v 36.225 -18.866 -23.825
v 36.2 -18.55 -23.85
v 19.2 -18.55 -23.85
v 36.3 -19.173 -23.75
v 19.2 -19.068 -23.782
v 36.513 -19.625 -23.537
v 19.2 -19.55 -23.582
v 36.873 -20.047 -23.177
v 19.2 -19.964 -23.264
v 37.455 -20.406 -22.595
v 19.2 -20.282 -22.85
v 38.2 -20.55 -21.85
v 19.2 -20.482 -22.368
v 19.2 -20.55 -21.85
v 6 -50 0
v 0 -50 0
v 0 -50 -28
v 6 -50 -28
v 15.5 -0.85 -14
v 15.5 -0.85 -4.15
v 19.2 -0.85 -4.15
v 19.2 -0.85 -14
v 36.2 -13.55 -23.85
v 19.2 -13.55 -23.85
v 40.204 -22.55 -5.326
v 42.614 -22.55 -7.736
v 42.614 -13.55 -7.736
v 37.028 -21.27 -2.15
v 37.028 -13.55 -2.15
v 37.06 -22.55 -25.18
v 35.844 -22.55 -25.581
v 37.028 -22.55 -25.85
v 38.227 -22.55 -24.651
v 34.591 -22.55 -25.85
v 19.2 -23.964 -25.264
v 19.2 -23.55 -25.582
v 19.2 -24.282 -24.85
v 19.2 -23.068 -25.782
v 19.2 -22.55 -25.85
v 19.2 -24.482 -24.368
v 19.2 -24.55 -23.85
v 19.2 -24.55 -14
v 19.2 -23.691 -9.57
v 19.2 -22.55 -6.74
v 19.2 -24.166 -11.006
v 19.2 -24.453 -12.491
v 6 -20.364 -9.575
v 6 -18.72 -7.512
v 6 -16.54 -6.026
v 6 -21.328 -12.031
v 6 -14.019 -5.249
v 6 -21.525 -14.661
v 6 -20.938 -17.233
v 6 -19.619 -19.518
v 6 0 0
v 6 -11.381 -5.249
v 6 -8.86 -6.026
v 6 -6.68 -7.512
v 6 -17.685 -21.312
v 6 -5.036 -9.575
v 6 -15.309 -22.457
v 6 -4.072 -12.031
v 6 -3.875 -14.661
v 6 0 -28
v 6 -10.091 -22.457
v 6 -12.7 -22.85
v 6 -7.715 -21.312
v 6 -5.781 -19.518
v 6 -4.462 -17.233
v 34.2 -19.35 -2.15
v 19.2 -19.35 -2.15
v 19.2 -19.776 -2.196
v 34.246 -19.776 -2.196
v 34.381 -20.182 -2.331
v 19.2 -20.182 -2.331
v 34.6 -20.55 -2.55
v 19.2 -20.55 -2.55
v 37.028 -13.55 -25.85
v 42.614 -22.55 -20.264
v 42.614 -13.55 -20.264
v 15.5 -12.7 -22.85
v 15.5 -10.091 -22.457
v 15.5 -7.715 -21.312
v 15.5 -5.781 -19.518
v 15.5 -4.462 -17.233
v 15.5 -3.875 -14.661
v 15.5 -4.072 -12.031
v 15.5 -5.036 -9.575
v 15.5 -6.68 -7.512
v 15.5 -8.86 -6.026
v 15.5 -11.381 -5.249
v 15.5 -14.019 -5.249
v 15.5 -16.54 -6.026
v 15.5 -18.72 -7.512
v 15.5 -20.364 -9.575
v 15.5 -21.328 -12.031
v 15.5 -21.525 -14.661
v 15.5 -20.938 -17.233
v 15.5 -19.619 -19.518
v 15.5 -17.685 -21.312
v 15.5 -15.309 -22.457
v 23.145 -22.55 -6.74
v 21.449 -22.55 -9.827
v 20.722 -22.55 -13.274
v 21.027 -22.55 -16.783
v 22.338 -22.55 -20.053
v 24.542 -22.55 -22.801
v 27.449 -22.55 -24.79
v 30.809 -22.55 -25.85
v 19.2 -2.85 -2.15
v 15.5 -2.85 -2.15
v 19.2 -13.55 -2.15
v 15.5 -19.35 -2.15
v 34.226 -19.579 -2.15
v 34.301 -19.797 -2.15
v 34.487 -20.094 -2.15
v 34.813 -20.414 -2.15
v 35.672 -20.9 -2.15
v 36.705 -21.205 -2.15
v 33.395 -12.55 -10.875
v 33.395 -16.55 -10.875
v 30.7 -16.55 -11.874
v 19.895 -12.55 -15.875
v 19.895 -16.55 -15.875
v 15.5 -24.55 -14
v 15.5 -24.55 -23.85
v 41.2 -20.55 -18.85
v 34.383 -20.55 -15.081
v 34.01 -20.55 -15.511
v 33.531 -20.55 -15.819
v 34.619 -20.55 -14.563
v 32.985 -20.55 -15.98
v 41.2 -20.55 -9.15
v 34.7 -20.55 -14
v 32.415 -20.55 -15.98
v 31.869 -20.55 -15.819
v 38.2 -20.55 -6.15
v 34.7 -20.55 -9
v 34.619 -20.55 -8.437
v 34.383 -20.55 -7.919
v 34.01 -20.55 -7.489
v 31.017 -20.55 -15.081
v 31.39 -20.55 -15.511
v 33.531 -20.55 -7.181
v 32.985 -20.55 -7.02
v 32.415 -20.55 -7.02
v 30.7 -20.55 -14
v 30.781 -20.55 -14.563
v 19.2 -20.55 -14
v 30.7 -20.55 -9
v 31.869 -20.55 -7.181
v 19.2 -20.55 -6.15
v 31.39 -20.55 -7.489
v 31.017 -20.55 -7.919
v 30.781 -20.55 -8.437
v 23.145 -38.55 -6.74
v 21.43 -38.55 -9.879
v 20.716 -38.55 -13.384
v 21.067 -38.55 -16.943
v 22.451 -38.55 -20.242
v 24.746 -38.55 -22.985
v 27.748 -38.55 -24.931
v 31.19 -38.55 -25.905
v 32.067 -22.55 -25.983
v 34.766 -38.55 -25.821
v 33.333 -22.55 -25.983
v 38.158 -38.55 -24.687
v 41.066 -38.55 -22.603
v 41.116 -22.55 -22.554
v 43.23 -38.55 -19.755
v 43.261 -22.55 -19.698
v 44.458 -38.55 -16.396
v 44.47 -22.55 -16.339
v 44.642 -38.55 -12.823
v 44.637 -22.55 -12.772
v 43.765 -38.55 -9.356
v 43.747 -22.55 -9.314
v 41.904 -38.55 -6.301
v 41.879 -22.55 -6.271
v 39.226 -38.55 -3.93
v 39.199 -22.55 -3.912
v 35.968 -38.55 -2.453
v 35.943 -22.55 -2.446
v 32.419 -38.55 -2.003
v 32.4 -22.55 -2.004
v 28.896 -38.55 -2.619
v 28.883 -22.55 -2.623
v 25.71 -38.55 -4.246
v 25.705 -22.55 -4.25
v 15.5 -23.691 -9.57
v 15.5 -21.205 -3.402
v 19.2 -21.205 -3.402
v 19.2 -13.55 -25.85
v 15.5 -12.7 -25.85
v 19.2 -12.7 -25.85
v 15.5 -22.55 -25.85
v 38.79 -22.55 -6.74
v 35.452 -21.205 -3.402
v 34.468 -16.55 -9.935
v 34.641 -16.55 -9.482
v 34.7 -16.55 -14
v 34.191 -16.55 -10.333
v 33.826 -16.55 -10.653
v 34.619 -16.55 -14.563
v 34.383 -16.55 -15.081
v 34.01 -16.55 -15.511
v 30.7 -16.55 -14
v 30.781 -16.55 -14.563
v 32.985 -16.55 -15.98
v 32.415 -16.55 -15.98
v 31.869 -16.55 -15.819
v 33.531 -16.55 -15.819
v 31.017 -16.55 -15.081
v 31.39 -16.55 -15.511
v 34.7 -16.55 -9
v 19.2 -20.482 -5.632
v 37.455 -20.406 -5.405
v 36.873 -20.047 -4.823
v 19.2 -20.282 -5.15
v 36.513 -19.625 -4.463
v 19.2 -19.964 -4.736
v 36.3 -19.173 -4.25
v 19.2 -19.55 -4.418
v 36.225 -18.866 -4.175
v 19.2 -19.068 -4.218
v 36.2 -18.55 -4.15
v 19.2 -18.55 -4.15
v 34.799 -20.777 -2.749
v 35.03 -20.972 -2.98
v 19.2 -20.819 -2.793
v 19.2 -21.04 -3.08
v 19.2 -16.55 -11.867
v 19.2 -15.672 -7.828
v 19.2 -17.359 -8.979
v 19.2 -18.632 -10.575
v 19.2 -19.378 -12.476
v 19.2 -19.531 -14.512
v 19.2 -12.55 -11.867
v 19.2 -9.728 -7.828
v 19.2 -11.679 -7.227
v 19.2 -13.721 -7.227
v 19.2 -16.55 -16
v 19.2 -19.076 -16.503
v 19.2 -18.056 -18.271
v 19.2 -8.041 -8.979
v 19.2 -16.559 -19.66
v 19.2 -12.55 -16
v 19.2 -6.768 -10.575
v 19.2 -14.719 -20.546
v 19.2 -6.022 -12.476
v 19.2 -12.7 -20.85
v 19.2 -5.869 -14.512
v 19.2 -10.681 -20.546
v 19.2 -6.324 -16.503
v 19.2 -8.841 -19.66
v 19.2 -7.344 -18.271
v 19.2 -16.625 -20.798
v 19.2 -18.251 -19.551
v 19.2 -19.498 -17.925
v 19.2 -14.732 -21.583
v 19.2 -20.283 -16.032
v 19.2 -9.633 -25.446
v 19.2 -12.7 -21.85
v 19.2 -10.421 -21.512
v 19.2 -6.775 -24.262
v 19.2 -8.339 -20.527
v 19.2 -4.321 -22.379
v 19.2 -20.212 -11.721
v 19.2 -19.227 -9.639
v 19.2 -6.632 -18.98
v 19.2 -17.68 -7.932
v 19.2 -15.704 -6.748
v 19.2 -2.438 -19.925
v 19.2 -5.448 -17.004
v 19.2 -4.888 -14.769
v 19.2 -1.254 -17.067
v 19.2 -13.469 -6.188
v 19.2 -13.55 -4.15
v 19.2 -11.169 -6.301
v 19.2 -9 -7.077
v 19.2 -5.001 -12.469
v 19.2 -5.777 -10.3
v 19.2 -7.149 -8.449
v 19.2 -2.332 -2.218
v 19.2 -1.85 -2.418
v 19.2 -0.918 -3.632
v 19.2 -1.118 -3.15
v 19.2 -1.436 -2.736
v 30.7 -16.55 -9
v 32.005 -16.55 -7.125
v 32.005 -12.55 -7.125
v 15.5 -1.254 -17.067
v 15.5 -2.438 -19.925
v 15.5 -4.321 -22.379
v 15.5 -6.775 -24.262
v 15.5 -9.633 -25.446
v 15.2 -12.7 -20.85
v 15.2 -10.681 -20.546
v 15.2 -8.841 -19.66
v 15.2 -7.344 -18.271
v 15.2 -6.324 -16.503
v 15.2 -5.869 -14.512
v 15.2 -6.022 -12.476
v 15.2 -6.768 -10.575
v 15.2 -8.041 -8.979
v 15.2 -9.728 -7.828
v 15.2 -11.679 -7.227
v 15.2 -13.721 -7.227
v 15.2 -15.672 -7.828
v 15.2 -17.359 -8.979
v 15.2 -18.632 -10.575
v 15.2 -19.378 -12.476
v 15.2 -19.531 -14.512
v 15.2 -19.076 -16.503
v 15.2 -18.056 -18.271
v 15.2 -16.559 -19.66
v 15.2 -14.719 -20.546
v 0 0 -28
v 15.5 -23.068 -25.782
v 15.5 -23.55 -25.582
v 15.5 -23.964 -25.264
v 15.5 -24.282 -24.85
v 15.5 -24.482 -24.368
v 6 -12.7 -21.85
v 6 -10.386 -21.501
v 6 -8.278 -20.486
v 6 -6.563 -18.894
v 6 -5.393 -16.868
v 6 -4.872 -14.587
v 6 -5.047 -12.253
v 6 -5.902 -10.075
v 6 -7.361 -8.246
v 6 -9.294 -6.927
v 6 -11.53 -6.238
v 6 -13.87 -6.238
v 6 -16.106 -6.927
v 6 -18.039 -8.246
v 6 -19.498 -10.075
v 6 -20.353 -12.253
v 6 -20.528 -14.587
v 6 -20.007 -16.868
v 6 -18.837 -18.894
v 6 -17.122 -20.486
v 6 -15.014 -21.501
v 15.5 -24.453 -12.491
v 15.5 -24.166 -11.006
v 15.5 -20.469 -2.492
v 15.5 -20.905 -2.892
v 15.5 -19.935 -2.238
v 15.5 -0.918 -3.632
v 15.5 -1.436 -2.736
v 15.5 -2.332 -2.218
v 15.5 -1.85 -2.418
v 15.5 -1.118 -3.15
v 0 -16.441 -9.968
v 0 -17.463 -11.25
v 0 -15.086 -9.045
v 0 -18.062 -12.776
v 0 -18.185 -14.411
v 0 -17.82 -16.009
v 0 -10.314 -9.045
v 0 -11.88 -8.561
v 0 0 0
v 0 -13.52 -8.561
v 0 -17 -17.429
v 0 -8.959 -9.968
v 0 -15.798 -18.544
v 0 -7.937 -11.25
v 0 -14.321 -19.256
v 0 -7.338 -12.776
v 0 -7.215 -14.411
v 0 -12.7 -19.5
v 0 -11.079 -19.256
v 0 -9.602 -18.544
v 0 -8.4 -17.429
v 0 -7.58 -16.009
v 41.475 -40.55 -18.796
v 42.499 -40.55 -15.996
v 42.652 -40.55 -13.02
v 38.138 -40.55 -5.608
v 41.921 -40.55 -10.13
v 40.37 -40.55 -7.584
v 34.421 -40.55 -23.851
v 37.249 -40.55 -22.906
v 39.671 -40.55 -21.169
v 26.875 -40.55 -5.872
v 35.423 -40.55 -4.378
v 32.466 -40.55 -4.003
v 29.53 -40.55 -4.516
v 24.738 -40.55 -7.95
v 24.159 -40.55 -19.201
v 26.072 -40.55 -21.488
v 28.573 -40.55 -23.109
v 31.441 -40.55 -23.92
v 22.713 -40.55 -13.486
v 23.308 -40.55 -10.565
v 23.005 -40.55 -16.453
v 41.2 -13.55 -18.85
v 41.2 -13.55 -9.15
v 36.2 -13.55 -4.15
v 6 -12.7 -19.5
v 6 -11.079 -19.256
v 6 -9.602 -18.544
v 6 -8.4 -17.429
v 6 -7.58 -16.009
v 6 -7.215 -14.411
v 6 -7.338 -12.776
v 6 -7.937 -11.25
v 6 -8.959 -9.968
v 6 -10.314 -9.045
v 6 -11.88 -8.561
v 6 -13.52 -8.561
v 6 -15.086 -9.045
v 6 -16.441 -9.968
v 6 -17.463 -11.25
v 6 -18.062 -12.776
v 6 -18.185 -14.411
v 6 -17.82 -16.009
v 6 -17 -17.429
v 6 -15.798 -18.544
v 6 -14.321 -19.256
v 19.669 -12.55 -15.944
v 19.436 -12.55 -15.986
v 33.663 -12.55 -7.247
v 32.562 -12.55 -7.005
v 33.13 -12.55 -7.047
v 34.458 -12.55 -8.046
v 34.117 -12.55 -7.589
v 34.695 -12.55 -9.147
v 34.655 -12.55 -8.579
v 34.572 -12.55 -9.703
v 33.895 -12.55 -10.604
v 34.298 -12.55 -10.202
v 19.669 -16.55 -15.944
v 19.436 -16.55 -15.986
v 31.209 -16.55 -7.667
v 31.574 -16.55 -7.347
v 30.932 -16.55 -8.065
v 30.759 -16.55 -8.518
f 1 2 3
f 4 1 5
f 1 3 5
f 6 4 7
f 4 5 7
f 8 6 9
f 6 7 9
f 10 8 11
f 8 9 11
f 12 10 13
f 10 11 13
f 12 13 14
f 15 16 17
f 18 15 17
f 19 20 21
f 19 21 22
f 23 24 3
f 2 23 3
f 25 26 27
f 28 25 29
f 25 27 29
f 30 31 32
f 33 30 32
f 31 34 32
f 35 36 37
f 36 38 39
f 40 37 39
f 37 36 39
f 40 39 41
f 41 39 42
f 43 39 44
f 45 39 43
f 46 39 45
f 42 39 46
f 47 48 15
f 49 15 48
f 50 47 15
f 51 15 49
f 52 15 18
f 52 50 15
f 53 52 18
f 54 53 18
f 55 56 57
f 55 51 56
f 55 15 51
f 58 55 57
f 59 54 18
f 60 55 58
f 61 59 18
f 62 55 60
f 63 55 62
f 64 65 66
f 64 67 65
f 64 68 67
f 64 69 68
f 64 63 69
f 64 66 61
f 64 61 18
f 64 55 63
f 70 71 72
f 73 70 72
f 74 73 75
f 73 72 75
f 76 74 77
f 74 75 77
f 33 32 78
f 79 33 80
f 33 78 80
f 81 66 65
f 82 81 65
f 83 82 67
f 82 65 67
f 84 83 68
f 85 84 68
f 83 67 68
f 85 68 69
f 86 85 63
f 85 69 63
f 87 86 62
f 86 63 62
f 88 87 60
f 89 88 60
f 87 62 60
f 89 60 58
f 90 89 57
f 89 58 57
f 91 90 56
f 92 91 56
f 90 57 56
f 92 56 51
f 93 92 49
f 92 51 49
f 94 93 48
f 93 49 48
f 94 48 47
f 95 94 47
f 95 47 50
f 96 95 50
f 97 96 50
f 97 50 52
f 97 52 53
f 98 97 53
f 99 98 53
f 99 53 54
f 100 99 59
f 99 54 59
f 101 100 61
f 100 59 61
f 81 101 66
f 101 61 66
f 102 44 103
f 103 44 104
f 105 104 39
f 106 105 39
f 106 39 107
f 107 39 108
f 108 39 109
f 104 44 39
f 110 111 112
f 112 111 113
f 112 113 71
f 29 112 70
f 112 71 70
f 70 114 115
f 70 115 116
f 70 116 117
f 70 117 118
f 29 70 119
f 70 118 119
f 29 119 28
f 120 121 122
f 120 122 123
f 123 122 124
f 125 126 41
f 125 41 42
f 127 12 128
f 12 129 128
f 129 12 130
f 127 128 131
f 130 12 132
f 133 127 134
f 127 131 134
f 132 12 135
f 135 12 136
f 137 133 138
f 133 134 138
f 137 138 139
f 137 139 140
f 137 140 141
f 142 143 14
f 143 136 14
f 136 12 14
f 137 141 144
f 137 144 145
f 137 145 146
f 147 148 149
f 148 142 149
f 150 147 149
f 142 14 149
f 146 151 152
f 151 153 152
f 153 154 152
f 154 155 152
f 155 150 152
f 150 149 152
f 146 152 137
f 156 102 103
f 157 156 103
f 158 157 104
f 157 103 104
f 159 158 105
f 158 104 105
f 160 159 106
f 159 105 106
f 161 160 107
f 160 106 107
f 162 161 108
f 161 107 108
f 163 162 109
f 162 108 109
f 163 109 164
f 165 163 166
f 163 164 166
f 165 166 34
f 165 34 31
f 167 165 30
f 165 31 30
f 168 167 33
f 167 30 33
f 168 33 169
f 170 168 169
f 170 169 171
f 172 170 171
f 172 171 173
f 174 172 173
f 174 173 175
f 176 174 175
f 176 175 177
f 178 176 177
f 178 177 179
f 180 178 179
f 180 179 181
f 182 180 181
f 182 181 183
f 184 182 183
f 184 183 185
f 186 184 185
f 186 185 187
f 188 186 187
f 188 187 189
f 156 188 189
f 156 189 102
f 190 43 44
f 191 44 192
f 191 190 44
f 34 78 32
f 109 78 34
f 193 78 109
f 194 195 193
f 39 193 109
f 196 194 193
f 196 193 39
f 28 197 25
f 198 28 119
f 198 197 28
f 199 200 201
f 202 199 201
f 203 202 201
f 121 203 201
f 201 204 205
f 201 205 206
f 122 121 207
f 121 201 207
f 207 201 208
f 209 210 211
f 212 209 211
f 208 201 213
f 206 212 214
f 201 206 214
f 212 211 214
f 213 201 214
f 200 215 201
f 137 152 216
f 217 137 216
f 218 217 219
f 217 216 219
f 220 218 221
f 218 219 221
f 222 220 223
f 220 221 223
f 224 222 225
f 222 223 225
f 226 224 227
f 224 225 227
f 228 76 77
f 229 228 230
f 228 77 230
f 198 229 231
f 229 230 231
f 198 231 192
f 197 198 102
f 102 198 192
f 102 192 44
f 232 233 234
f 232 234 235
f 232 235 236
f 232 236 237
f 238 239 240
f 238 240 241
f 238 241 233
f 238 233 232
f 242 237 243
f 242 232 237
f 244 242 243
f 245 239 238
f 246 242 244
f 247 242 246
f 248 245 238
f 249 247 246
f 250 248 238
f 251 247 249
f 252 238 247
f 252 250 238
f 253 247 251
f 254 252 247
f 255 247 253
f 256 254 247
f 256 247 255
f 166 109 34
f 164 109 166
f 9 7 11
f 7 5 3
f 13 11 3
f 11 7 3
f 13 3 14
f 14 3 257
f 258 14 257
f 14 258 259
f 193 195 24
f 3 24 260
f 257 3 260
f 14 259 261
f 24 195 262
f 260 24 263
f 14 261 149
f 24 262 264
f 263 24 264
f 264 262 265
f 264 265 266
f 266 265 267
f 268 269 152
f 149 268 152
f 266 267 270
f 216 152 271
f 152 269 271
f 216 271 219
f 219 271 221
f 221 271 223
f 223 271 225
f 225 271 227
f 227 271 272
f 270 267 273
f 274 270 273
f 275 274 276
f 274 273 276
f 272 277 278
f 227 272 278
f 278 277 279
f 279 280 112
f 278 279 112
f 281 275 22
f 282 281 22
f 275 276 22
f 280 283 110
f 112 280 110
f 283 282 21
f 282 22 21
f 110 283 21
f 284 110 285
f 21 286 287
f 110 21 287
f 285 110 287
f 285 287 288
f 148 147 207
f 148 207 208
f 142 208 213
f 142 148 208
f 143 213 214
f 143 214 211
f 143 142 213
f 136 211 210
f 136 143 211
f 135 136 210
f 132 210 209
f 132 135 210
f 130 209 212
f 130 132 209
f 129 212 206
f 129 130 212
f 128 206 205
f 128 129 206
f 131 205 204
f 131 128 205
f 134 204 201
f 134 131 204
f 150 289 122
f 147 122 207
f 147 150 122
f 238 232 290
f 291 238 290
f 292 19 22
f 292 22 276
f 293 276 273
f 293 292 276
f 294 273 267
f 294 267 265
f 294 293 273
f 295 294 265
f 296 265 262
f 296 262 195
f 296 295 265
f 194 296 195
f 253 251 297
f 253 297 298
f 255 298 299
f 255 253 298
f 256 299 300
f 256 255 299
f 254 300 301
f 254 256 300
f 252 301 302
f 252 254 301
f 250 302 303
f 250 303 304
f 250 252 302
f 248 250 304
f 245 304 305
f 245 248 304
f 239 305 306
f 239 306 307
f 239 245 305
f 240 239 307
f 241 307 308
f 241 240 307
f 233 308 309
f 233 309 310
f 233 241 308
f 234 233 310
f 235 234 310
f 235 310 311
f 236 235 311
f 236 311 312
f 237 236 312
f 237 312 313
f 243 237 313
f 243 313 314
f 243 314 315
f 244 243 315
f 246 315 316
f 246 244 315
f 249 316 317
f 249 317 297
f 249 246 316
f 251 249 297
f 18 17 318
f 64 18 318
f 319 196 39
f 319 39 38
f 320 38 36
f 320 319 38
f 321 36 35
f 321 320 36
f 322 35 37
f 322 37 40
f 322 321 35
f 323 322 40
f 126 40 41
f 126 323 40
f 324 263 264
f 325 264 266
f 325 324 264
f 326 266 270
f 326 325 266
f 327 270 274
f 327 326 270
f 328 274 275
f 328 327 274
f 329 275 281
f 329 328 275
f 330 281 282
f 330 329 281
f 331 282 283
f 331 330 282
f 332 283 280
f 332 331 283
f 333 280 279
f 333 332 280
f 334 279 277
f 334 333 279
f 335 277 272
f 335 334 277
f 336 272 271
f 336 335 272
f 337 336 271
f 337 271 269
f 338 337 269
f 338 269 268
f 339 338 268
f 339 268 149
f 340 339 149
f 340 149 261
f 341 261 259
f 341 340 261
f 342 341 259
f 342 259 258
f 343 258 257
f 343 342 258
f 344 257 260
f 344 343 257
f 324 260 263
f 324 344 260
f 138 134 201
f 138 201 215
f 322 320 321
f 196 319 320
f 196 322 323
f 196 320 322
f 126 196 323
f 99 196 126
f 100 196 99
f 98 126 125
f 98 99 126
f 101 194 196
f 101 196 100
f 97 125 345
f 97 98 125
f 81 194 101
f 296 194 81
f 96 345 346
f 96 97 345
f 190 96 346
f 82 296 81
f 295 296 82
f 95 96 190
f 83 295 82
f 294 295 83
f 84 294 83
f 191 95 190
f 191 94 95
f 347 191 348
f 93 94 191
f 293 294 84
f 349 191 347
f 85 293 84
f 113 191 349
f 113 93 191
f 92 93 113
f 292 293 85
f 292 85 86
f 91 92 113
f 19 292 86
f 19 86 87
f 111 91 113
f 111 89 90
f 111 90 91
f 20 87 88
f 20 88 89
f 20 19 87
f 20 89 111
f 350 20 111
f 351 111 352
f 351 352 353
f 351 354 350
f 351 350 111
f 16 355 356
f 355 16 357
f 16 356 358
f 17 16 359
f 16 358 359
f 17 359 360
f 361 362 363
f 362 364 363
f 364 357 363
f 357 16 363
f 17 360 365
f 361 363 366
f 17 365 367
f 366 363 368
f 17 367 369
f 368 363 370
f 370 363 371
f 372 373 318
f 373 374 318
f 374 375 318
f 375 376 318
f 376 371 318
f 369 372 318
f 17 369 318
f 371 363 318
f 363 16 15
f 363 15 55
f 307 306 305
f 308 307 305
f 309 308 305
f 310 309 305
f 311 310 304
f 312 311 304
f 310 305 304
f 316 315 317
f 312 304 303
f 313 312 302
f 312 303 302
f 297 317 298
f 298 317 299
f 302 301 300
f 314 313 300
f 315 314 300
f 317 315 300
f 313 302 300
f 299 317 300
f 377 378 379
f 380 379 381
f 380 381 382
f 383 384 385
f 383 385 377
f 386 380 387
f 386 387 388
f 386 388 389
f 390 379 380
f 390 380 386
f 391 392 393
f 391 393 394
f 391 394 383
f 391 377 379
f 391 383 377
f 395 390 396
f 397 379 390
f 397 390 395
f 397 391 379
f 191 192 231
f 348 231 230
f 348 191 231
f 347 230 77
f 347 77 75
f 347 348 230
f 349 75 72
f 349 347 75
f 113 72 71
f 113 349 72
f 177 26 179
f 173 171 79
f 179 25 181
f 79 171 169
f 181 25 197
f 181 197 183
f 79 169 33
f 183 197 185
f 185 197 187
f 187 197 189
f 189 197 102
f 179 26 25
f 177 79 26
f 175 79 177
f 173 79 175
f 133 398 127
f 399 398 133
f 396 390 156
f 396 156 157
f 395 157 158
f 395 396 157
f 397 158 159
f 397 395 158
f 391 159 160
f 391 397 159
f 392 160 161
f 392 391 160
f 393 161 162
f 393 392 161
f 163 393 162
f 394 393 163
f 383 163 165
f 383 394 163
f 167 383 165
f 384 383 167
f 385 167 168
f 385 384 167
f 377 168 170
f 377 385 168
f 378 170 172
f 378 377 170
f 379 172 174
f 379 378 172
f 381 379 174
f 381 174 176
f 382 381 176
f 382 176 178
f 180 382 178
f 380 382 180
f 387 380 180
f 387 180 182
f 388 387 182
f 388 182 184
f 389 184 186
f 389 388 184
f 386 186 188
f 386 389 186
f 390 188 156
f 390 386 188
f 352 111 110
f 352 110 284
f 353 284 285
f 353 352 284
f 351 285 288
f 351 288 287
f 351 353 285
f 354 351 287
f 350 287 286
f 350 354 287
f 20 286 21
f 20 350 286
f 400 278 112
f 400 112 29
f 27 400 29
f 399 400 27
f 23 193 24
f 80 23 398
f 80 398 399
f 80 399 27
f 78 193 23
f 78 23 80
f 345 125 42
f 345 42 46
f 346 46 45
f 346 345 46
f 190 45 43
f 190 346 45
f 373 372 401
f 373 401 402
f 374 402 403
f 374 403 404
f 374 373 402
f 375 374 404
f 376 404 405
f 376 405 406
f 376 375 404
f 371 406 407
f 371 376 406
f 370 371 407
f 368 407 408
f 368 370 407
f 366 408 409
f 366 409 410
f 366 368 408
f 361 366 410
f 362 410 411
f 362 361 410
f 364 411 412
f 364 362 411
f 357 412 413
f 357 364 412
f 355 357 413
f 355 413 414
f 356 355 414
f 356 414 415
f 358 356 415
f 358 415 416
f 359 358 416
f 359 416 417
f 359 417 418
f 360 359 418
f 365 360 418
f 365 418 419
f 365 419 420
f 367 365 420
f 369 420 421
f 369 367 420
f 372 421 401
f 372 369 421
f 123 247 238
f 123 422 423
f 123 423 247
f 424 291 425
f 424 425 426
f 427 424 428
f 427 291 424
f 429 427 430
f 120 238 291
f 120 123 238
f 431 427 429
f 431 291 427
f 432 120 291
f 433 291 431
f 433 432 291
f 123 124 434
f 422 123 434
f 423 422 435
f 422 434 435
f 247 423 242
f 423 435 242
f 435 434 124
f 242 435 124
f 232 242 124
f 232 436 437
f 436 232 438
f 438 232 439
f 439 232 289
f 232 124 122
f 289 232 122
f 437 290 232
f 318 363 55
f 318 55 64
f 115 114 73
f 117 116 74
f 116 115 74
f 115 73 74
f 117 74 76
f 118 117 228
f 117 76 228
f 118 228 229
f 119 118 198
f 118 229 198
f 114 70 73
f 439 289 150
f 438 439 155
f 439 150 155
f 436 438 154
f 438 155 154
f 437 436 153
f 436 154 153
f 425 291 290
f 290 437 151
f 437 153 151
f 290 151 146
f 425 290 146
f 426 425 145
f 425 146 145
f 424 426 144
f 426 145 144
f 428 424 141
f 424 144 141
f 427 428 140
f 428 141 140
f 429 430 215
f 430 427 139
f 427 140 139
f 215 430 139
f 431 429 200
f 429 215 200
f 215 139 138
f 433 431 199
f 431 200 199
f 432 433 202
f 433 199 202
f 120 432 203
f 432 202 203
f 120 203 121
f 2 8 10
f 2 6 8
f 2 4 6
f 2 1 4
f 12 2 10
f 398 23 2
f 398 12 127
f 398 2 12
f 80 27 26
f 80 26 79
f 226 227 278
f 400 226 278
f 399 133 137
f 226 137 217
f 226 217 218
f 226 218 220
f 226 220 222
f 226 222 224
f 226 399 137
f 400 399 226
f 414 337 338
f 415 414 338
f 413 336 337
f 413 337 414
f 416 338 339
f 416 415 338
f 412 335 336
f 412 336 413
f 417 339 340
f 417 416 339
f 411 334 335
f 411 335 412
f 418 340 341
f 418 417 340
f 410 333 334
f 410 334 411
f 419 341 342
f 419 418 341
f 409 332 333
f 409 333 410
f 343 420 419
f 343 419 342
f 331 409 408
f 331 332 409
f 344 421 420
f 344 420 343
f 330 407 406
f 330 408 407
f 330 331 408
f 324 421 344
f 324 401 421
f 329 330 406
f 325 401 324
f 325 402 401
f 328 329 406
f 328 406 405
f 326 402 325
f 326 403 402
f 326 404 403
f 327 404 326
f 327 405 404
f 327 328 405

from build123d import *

# Parameters (mm, degrees)
SKETCH1_W               = 28
SKETCH1_H               = 50
SKETCH1_R               = 5.5
BOSS_EXTRUDE1_DEPTH     = 6
SKETCH2_R               = 8.85
SKETCH2_R_2             = 7.85
BOSS_EXTRUDE2_DEPTH     = 9.5
SKETCH3_R               = 7.85
BOSS_EXTRUDE3_DEPTH     = 3.7
BOSS_EXTRUDE4_DEPTH     = 22
CHAMFER1_SIZE           = 7
BOSS_EXTRUDE5_DEPTH     = 2
BOSS_EXTRUDE6_DEPTH     = 2
BOSS_EXTRUDE7_DEPTH     = 9
CUT_EXTRUDE1_DEPTH      = 63.678335221
CUT_EXTRUDE1_DEPTH_BACK = 63.678335221
BOSS_EXTRUDE8_DEPTH     = 4
BOSS_EXTRUDE9_DEPTH     = 4
SKETCH12_R              = 6.85
BOSS_EXTRUDE10_DEPTH    = 4
SKETCH13_R              = 12
BOSS_EXTRUDE11_DEPTH    = 18
CHAMFER2_SIZE           = 2


with BuildPart() as part:
    # Sketch1 → Boss-Extrude1 (new body)
    with BuildSketch(Plane(origin=(0, 0, 0), x_dir=(0, 0, -1), z_dir=(1, 0, 0))):
        with Locations((14, -25)):
            Rectangle(SKETCH1_W, SKETCH1_H)
        with Locations((14, -12.7)):
            Circle(SKETCH1_R, mode=Mode.SUBTRACT)
    extrude(amount=BOSS_EXTRUDE1_DEPTH)

    # Sketch2 → Boss-Extrude2 (add)
    with BuildSketch(Plane(origin=(6, 0, 0), x_dir=(0, 0, -1), z_dir=(1, 0, 0))):
        with Locations((14, -12.7)):
            Circle(SKETCH2_R)
        with Locations((14, -12.7)):
            Circle(SKETCH2_R_2, mode=Mode.SUBTRACT)
    extrude(amount=BOSS_EXTRUDE2_DEPTH)

    # Sketch3 → Boss-Extrude3 (add)
    with BuildSketch(Plane(origin=(15.5, 0, 0), x_dir=(0, 0, -1), z_dir=(1, 0, 0))):
        with BuildLine():
            Line((2.15, -12.7), (2.15, -2.85))
            ThreePointArc((2.15, -2.85), (2.735786438, -1.435786438), (4.15, -0.85))
            Line((4.15, -0.85), (14, -0.85))
            ThreePointArc((14, -0.85), (22.379215357, -4.320784643), (25.85, -12.7))
            Line((25.85, -12.7), (25.85, -22.55))
            ThreePointArc((25.85, -22.55), (25.264213562, -23.964213562), (23.85, -24.55))
            Line((23.85, -24.55), (14, -24.55))
            ThreePointArc((14, -24.55), (11.74368498, -24.333208609), (9.569926867, -23.690766672))
            Line((9.569926867, -23.690766672), (3.402308332, -21.204770746))
            ThreePointArc((3.402308332, -21.204770746), (2.492383739, -20.46885486), (2.15, -19.34978903))
            Line((2.15, -19.34978903), (2.15, -12.7))
        make_face()
        with Locations((14, -12.7)):
            Circle(SKETCH3_R, mode=Mode.SUBTRACT)
    extrude(amount=BOSS_EXTRUDE3_DEPTH)

    # Sketch4 → Boss-Extrude4 (add)
    with BuildSketch(Plane(origin=(19.2, 0, 0), x_dir=(0, 0, -1), z_dir=(1, 0, 0))):
        with BuildLine():
            Line((21.85, -20.55), (6.15, -20.55))
            ThreePointArc((6.15, -20.55), (4.735786438, -19.964213562), (4.15, -18.55))
            Line((4.15, -18.55), (4.15, -13.55))
            Line((4.15, -13.55), (2.15, -13.55))
            Line((2.15, -13.55), (2.15, -19.34978903))
            ThreePointArc((2.15, -19.34978903), (2.252675107, -19.982369656), (2.55015825, -20.55))
            ThreePointArc((2.55015825, -20.55), (2.931431385, -20.935692725), (3.402308332, -21.204770746))
            Line((3.402308332, -21.204770746), (6.739747784, -22.55))
            Line((6.739747784, -22.55), (25.85, -22.55))
            Line((25.85, -22.55), (25.85, -20.55))
            Line((25.85, -20.55), (25.85, -13.55))
            Line((25.85, -13.55), (23.85, -13.55))
            Line((23.85, -13.55), (23.85, -18.55))
            ThreePointArc((23.85, -18.55), (23.264213562, -19.964213562), (21.85, -20.55))
        make_face()
    extrude(amount=BOSS_EXTRUDE4_DEPTH)

    # Chamfer1
    # the kernel refuses this chamfer: 7 mm, written as the material it takes off along each edge
    with BuildSketch(Plane(origin=(41.2, 4.451780916, -25.85), x_dir=(0.027495876610586112, 0, 0.9996219169112968), z_dir=(0, -1, 0))) as chamfer1_piece_1:
        Polygon((CHAMFER1_SIZE * 0.999621916911, CHAMFER1_SIZE * 0.0274958766106), (-CHAMFER1_SIZE * 0.0274958766106, CHAMFER1_SIZE * 0.999621916911), (0, 0), align=None)
    extrude(amount=45.003561832, mode=Mode.SUBTRACT)
    with BuildSketch(Plane(origin=(41.2, 4.451780916, -2.15), x_dir=(0.02749587661058612, 0, -0.9996219169112968), z_dir=(0, -1, 0))) as chamfer1_piece_2:
        Polygon((CHAMFER1_SIZE * 0.999621916911, -CHAMFER1_SIZE * 0.0274958766106), (-CHAMFER1_SIZE * 0.0274958766106, -CHAMFER1_SIZE * 0.999621916911), (0, 0), align=None)
    extrude(amount=41.803350861, mode=Mode.SUBTRACT)

    # Sketch6 → Boss-Extrude5 (add)
    with BuildSketch(Plane(origin=(16.025, 0, 16.025), x_dir=(0.7071067811865438, 0, -0.7071067811865512), z_dir=(0.7071067811865512, 0, 0.7071067811865438))):
        with BuildLine():
            Line((28.531758621, -13.55), (35.602826433, -13.55))
            Line((35.602826433, -13.55), (35.602826433, -20.55))
            Line((35.602826433, -20.55), (35.602826433, -22.55))
            Line((35.602826433, -22.55), (32.19421506, -22.55))
            Line((32.19421506, -22.55), (27.474362924, -21.204770746))
            add(Edge.make_bspline(
                [(25.703331496, -19.34978903), (25.703331496, -20.7), (27.474362924, -21.204770746)],
                knots=[0, 0, 0, 1.187644261, 1.187644261, 1.187644261], degree=2, weights=[1, 0.82880813, 1]))
            Line((25.703331496, -19.34978903), (25.703331496, -13.55))
            Line((25.703331496, -13.55), (28.531758621, -13.55))
        make_face()
    extrude(amount=BOSS_EXTRUDE5_DEPTH)

    # Sketch7 → Boss-Extrude6 (add)
    with BuildSketch(Plane(origin=(30.025, 0, -30.025), x_dir=(-0.7071067811865438, 0, -0.7071067811865512), z_dir=(0.7071067811865512, 0, -0.7071067811865438))):
        Polygon((-15.80383656, -20.55), (-15.80383656, -13.55), (-8.732768748, -13.55), (-5.904341623, -13.55), (-5.904341623, -22.55), (-15.80383656, -22.55), align=None)
    extrude(amount=BOSS_EXTRUDE6_DEPTH)

    # Sketch8 → Boss-Extrude7 (add)
    with BuildSketch(Plane(origin=(0, -13.55, 0), x_dir=(1, 0, 0), z_dir=(0, 1, 0))):
        Polygon((41.2, 18.85), (41.2, 9.15), (42.614213562, 7.735786438), (42.614213562, 20.264213562), align=None)
    extrude(amount=-BOSS_EXTRUDE7_DEPTH)

    # Sketch9 → Cut-Extrude1 (cut, two sides: drawn at the far end of the back side and taken through both)
    with BuildSketch(Plane(origin=(0, -13.55, 0), x_dir=(1, 0, 0), z_dir=(0, 1, 0)).offset(-CUT_EXTRUDE1_DEPTH_BACK)):
        Polygon((34.2, 2.15), (37.028427125, 2.15), (35.614213562, 0.735786438), align=None)
        Polygon((34.2, 25.85), (37.028427125, 25.85), (35.614213562, 27.264213562), align=None)
    extrude(amount=CUT_EXTRUDE1_DEPTH + CUT_EXTRUDE1_DEPTH_BACK, mode=Mode.SUBTRACT)

    # Sketch10 → Boss-Extrude8 (add)
    with BuildSketch(Plane(origin=(0, -20.55, 0), x_dir=(1, 0, 0), z_dir=(0, 1, 0))):
        with BuildLine():
            Line((34.7, 14), (34.7, 9))
            ThreePointArc((34.7, 9), (32.7, 7), (30.7, 9))
            Line((30.7, 9), (30.7, 14))
            ThreePointArc((30.7, 14), (32.7, 16), (34.7, 14))
        make_face()
    extrude(amount=BOSS_EXTRUDE8_DEPTH)

    # Sketch11 → Boss-Extrude9 (add)
    with BuildSketch(Plane(origin=(0, -16.55, 0), x_dir=(1, 0, 0), z_dir=(0, 1, 0))):
        with BuildLine():
            Line((18.505371288, 12.124502479), (32.005371288, 7.124502479))
            ThreePointArc((32.005371288, 7.124502479), (34.575497521, 8.305371288), (33.394628712, 10.875497521))
            Line((33.394628712, 10.875497521), (19.894628712, 15.875497521))
            ThreePointArc((19.894628712, 15.875497521), (17.324502479, 14.694628712), (18.505371288, 12.124502479))
        make_face()
    extrude(amount=BOSS_EXTRUDE9_DEPTH)

    # Sketch12 → Boss-Extrude10 (add)
    with BuildSketch(Plane(origin=(19.2, 0, 0), x_dir=(0, 0, -1), z_dir=(1, 0, 0))):
        with Locations((14, -12.7)):
            Circle(SKETCH12_R)
    extrude(amount=-BOSS_EXTRUDE10_DEPTH)

    # Sketch13 → Boss-Extrude11 (add)
    with BuildSketch(Plane.XZ.offset(22.55)):
        with Locations(Location((32.7, -14, 0), (0, 0, 142.769645669))):
            Circle(SKETCH13_R)
    extrude(amount=BOSS_EXTRUDE11_DEPTH)

    # Chamfer2
    chamfer2_edges = [part.edges().sort_by_distance(p)[0] for p in [
        (42.254513999, -40.55, -21.260252216),
    ]]
    chamfer(chamfer2_edges, length=CHAMFER2_SIZE)


solid = part.part
